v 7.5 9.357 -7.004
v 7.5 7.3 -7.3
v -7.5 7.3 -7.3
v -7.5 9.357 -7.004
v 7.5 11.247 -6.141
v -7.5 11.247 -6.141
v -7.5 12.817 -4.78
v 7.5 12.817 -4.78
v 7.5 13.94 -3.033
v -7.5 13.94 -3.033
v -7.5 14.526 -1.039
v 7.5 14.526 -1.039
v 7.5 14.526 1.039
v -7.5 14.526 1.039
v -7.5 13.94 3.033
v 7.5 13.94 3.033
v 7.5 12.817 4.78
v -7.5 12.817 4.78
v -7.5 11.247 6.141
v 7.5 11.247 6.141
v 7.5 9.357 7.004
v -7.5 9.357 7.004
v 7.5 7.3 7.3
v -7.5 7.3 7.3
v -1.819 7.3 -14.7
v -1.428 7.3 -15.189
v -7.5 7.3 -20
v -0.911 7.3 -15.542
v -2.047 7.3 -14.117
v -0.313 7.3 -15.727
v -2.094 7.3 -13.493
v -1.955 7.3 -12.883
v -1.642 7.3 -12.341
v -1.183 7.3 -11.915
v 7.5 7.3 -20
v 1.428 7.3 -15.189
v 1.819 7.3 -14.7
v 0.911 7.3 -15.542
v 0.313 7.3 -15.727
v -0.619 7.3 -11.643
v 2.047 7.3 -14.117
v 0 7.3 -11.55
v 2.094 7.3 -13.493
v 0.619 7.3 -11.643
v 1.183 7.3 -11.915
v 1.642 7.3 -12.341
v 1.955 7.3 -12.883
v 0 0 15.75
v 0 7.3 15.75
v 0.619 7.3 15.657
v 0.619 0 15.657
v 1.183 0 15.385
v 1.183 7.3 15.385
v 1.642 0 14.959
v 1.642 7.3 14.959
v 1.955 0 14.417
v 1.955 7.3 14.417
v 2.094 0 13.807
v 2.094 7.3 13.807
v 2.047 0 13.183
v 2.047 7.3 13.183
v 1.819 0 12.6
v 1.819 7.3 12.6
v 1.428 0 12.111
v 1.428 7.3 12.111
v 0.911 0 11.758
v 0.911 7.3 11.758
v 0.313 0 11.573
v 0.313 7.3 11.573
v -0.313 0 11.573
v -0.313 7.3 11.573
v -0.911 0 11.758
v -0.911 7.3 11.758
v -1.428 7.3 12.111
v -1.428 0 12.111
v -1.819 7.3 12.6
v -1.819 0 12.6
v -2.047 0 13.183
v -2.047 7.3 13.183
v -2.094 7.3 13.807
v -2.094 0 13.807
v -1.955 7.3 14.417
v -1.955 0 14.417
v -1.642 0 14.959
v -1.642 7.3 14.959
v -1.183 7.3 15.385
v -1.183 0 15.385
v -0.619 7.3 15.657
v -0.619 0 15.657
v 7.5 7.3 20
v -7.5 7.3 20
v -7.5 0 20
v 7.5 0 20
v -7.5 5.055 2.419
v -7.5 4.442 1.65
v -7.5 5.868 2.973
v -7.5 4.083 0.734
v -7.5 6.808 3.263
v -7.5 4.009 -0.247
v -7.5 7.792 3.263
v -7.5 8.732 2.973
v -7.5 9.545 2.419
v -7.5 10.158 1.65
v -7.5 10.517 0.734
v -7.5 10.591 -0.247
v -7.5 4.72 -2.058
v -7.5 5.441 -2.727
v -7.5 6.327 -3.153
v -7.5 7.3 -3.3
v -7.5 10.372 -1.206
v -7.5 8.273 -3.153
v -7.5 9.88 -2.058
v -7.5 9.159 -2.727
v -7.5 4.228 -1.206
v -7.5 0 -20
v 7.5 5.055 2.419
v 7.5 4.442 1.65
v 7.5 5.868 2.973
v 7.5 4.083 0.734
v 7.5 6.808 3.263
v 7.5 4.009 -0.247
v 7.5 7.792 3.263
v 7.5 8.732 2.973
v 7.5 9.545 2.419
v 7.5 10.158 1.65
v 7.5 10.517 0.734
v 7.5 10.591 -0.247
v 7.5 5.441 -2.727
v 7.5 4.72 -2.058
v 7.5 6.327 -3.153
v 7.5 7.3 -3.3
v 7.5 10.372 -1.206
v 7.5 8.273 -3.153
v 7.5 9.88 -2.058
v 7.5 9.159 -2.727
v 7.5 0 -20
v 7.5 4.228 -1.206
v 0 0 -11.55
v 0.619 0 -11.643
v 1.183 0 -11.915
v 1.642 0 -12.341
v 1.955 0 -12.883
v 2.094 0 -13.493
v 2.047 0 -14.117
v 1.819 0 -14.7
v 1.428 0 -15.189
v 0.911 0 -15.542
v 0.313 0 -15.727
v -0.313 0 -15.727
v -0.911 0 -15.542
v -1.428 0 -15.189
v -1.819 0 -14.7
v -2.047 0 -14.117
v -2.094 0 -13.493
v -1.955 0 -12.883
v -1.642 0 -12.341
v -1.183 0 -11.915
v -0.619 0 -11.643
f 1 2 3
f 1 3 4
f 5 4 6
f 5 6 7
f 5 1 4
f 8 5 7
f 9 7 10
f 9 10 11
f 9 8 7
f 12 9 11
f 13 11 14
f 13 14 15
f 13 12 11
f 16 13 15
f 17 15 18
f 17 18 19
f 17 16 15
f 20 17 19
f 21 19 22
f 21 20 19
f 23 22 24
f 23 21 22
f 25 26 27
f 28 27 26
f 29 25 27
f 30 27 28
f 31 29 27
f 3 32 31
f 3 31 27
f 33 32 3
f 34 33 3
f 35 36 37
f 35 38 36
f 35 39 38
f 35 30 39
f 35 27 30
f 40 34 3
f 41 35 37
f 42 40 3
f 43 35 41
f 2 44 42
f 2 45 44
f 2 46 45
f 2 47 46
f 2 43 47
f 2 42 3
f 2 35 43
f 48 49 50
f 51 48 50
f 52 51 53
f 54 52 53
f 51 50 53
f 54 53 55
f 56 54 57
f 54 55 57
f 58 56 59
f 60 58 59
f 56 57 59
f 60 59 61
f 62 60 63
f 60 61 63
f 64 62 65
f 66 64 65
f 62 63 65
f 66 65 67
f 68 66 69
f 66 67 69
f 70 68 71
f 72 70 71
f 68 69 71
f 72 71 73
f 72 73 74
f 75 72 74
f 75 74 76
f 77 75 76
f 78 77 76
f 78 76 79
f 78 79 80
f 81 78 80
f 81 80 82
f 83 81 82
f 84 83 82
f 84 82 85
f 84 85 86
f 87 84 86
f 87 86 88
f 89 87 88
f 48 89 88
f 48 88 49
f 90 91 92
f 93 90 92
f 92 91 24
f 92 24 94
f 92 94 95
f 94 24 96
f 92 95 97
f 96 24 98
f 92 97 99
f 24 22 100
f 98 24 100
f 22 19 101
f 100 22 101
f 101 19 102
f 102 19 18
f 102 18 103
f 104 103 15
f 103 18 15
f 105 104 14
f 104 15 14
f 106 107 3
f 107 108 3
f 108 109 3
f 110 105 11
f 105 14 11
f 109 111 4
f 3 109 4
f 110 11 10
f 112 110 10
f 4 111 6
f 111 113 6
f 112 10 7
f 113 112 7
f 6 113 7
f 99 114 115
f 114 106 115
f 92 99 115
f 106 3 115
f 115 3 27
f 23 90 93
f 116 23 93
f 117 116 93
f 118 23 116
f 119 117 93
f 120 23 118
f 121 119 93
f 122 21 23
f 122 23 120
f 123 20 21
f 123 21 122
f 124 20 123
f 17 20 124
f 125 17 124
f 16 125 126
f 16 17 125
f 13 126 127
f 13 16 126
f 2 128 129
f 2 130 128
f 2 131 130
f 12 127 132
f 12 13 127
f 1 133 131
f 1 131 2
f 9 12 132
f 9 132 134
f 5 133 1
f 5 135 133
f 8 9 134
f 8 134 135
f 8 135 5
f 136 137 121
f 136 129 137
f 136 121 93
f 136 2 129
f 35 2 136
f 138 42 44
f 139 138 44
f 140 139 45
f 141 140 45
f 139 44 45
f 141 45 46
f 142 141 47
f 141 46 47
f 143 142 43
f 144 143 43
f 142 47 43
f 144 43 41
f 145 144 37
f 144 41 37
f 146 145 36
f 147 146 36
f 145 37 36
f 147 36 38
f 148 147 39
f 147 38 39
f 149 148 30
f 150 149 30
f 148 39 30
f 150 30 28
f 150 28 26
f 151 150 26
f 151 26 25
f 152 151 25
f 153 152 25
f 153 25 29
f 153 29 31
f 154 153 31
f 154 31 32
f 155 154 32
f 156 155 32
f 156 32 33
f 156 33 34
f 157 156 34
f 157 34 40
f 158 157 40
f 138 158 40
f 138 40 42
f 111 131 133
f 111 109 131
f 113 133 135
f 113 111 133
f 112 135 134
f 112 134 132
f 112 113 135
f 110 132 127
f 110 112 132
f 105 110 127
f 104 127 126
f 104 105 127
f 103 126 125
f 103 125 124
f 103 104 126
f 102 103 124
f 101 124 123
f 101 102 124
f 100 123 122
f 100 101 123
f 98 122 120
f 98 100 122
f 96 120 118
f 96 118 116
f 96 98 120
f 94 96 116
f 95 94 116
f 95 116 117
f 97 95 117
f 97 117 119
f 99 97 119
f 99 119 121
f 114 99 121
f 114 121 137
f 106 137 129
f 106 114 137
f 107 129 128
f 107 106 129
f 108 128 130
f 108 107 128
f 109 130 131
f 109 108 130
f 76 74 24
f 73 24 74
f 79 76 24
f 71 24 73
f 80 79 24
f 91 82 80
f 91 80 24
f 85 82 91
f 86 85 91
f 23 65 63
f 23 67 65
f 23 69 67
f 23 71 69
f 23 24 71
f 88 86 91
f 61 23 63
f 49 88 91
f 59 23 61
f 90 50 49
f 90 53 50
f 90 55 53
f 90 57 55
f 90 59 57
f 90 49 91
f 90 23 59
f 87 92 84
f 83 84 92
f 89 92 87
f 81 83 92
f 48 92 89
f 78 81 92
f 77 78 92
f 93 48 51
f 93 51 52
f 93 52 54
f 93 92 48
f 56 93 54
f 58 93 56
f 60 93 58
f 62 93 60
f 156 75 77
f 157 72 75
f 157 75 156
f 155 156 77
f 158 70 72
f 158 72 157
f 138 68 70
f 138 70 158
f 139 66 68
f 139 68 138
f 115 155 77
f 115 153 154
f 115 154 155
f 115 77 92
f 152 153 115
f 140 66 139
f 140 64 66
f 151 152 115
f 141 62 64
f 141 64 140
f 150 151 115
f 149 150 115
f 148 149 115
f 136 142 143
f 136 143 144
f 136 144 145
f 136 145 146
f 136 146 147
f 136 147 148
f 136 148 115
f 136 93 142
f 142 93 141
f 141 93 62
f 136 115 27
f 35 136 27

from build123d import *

# Parameters (mm, degrees)
CROQUIS1_R              = 3.3
SALIENTE_EXTRUIR1_DEPTH = 7.5
CORTAR_EXTRUIR1_REACH   = 24.573
CROQUIS2_R              = 2.1


with BuildPart() as part:
    # Croquis1 → Saliente-Extruir1 (new, symmetric)
    with BuildSketch(Plane(origin=(0, 0, 0), x_dir=(0, 0, -1), z_dir=(1, 0, 0))):
        with BuildLine():
            Line((-20, 0), (20, 0))
            Line((20, 0), (20, 7.3))
            Line((20, 7.3), (7.3, 7.3))
            ThreePointArc((7.3, 7.3), (0, 14.6), (-7.3, 7.3))
            Line((-7.3, 7.3), (-20, 7.3))
            Line((-20, 7.3), (-20, 0))
        make_face()
        with Locations((0, 7.3)):
            Circle(CROQUIS1_R, mode=Mode.SUBTRACT)
    extrude(amount=SALIENTE_EXTRUIR1_DEPTH, both=True)

    # Croquis2 → Cortar-Extruir1 (cut, up to next)
    with BuildSketch(Plane(origin=(0, 7.3, 0), x_dir=(1, 0, 0), z_dir=(0, 1, 0)), mode=Mode.PRIVATE) as cortar_extruir1_sk1:
        with Locations(Location((0, -13.65, 0), (0, 0, 270))):
            Circle(CROQUIS2_R)
    cortar_extruir1_tool1 = extrude(cortar_extruir1_sk1.sketch, amount=-CORTAR_EXTRUIR1_REACH, mode=Mode.PRIVATE) & part.part
    # Croquis2 → Cortar-Extruir1 (cut, up to next)
    with BuildSketch(Plane(origin=(0, 7.3, 0), x_dir=(1, 0, 0), z_dir=(0, 1, 0)), mode=Mode.PRIVATE) as cortar_extruir1_sk2:
        with Locations(Location((0, 13.65, 0), (0, 0, 270))):
            Circle(CROQUIS2_R)
    cortar_extruir1_tool2 = extrude(cortar_extruir1_sk2.sketch, amount=-CORTAR_EXTRUIR1_REACH, mode=Mode.PRIVATE) & part.part
    add(cortar_extruir1_tool1.solids().sort_by_distance((0, 7.3, 13.65))[0], mode=Mode.SUBTRACT)
    add(cortar_extruir1_tool2.solids().sort_by_distance((0, 7.3, -13.65))[0], mode=Mode.SUBTRACT)


solid = part.part
